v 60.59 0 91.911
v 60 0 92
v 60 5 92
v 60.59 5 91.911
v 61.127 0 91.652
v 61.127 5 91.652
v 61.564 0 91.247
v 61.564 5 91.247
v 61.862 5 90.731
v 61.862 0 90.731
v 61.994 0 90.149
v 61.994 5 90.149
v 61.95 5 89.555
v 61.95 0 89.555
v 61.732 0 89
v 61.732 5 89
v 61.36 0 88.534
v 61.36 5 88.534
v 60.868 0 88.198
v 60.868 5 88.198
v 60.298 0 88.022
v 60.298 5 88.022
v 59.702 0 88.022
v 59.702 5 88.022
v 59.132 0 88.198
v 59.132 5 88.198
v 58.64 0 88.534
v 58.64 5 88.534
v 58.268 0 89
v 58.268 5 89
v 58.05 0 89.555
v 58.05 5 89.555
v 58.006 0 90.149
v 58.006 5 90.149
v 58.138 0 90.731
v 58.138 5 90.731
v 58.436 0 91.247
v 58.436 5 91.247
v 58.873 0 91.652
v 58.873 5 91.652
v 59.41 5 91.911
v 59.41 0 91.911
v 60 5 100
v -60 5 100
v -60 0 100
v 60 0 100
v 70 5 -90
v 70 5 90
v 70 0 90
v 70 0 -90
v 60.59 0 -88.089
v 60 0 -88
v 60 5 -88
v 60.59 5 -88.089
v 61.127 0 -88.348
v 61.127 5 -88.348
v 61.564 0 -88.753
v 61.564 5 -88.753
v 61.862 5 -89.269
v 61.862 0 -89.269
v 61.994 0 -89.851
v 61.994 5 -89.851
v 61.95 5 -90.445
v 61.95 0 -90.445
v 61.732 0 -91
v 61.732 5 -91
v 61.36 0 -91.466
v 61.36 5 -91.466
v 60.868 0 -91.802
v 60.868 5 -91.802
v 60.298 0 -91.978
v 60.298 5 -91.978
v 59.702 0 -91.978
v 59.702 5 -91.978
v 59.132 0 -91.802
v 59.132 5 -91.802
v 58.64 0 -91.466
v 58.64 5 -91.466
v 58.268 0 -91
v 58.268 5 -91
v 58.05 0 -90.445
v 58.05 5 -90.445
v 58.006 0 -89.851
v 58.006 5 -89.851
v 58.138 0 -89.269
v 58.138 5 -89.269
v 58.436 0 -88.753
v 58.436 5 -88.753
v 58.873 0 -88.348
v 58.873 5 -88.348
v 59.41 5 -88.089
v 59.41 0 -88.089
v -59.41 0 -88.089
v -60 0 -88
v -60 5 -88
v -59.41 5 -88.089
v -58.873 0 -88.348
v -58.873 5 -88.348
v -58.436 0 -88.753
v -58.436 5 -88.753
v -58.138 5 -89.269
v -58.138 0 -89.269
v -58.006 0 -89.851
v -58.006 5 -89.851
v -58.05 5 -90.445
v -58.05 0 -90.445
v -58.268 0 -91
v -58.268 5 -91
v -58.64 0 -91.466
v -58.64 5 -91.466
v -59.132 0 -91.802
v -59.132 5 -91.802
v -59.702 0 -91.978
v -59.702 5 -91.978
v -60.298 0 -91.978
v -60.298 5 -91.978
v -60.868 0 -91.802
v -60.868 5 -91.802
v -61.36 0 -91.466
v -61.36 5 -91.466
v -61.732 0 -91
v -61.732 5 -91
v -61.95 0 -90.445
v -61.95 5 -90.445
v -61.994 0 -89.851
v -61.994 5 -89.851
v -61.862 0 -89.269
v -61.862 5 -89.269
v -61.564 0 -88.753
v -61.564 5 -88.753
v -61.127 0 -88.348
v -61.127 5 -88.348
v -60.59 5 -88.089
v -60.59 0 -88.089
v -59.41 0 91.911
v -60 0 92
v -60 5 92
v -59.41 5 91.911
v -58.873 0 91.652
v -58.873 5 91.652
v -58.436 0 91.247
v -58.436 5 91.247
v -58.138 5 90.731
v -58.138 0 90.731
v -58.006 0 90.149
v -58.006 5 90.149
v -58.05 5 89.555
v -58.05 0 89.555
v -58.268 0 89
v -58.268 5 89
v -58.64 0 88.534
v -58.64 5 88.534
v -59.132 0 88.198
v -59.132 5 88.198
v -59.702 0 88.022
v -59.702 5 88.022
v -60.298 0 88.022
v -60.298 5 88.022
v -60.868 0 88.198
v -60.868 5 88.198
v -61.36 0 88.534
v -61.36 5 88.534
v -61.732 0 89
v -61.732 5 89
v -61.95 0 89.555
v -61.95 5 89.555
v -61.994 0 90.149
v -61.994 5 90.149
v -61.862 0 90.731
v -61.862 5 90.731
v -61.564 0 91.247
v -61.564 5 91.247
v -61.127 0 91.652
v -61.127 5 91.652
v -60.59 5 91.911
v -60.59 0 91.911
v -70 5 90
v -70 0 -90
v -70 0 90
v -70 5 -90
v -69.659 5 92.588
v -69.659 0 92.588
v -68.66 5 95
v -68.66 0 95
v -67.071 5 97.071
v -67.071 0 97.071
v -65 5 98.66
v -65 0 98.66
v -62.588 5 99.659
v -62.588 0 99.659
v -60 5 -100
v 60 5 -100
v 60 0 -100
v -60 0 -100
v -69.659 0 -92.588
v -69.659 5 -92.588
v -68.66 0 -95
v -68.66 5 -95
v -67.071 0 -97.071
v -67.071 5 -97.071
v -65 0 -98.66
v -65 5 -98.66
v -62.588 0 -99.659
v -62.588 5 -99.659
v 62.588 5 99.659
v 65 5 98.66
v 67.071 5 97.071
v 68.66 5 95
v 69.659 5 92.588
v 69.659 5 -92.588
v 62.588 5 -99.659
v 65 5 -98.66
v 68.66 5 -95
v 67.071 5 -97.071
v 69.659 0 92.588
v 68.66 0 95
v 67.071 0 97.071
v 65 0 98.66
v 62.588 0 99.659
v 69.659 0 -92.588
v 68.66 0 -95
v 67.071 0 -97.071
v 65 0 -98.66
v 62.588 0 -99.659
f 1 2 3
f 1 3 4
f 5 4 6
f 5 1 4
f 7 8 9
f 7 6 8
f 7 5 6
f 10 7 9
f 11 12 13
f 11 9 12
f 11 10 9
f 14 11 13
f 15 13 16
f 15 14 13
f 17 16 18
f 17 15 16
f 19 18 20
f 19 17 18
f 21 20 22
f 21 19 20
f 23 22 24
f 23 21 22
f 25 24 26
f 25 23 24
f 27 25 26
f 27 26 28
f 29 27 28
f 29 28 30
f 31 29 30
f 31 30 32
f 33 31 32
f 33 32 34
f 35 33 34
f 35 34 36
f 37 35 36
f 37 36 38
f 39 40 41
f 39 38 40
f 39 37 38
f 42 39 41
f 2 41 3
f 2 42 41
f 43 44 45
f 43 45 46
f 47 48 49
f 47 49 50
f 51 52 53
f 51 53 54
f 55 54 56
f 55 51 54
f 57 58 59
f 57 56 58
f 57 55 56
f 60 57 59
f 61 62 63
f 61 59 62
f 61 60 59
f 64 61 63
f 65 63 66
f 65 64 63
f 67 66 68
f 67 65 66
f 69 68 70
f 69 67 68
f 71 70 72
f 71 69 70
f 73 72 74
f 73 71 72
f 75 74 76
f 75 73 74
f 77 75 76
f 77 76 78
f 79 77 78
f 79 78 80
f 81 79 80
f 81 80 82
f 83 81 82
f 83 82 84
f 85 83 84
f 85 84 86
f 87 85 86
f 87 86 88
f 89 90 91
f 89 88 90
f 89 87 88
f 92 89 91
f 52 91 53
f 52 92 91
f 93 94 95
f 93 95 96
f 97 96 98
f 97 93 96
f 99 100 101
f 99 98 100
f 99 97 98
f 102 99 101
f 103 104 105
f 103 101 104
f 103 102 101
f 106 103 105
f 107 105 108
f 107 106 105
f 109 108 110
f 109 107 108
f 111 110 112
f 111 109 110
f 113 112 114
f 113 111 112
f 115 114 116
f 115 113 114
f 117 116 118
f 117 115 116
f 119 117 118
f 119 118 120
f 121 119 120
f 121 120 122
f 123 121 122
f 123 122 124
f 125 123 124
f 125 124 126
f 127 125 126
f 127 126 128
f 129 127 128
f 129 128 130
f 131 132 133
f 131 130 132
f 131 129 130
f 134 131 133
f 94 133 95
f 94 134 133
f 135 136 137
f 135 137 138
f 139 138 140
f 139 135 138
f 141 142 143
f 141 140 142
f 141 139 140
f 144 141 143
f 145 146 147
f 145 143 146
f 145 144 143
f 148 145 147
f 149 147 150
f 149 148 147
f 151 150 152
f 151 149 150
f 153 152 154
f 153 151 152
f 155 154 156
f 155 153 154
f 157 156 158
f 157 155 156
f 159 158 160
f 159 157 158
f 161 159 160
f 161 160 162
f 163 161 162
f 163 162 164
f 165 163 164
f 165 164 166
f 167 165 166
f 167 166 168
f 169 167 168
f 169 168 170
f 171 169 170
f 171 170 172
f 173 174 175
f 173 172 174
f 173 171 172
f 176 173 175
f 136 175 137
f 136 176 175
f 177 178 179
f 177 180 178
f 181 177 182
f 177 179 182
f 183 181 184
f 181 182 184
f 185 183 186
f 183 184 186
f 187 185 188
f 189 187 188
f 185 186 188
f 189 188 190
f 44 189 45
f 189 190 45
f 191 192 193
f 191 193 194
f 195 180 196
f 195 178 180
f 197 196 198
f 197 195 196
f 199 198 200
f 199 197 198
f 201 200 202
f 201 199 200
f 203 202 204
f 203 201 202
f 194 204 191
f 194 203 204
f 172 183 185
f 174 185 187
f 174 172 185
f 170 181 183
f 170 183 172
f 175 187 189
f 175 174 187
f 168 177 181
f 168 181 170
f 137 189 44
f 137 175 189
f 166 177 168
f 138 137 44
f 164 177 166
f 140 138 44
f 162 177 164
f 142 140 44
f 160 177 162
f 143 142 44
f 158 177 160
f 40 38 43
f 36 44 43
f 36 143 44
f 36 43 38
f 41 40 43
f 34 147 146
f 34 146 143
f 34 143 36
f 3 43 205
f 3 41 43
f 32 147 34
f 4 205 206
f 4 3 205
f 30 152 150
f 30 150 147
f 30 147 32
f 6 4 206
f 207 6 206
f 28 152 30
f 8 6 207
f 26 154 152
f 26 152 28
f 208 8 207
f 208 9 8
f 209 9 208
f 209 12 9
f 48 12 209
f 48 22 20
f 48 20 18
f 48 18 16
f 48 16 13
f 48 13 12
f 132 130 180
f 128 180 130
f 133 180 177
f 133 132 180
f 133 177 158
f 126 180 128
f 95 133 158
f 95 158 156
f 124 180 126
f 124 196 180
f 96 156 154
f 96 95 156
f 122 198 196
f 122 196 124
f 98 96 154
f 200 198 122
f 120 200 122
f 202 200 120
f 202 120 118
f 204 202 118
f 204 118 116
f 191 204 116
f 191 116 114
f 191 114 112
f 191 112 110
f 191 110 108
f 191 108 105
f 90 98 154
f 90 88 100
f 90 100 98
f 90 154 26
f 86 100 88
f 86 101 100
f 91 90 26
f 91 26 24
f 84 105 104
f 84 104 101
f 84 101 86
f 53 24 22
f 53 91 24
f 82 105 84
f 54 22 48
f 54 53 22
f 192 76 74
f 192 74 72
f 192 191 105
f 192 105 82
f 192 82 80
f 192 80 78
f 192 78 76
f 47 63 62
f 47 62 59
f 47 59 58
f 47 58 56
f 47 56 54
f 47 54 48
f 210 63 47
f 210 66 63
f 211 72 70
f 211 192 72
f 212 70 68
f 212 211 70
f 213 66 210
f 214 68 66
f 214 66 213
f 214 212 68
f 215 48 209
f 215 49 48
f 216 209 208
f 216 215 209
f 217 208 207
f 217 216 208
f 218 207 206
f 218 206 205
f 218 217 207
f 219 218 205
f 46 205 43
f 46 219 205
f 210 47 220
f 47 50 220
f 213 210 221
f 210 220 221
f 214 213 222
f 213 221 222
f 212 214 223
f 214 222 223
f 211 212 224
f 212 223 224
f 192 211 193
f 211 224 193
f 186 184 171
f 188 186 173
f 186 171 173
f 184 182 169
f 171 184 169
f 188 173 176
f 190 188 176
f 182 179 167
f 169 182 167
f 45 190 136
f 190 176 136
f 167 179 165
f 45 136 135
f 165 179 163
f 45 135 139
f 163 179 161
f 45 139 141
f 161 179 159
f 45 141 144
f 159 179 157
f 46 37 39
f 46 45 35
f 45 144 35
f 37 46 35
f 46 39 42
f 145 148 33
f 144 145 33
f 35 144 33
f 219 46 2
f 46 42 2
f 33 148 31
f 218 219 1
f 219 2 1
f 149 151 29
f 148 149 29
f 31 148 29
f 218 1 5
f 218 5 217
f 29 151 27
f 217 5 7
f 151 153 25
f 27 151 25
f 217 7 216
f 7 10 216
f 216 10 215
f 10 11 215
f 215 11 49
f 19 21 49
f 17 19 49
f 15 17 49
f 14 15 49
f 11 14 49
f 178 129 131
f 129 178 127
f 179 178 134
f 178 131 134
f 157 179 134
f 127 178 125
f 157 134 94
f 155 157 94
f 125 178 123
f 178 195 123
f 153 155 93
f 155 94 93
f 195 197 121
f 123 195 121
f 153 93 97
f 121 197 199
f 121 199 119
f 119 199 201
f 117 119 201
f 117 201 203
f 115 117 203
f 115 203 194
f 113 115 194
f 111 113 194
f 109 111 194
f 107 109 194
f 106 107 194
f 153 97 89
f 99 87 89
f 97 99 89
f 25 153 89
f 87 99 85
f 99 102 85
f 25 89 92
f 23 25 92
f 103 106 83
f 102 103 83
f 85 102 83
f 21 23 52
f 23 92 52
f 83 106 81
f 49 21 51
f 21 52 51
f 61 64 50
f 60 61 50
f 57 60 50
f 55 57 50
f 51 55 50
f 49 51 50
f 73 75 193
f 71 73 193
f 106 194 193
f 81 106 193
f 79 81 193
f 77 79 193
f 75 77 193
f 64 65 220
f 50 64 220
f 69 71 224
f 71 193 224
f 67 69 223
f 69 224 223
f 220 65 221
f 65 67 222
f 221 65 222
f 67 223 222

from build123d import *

# Parameters (mm, degrees)
SKETCH_1_W               = 180
SKETCH_1_H               = 180
EXTRUDE_1_DEPTH          = 5
SKETCH_2_W               = 180
SKETCH_2_H               = 2.5
EXTRUDE_2_DEPTH          = 5
CUT_EXTRUDE_1_DEPTH      = 130.155913531
CUT_EXTRUDE_1_DEPTH_BACK = 130.155913531
SKETCH_3_R               = 2.65
SKETCH_3_W               = 12.5
SKETCH_3_H               = 182.5
SKETCH_4_W               = 167.5
SKETCH_4_H               = 2.5
EXTRUDE_3_DEPTH          = 5
FILLET_1_R               = 10
SKETCH_5_R               = 5.825636989
EXTRUDE_4_DEPTH          = 5
CUT_EXTRUDE_2_DEPTH      = 130.155913531
CUT_EXTRUDE_2_DEPTH_BACK = 130.155913531
SKETCH_6_R               = 1.5
EXTRUDE_5_DEPTH          = 5
CUT_EXTRUDE_3_DEPTH      = 135.629120178
CUT_EXTRUDE_3_DEPTH_BACK = 135.629120178
FILLET_2_R               = 10
CUT_EXTRUDE_4_DEPTH      = 123.167917229
CUT_EXTRUDE_4_DEPTH_BACK = 123.167917229
SKETCH_9_R               = 2


with BuildPart() as part:
    # 草图1 → 凸台-拉伸1 (new body)
    with BuildSketch(Plane(origin=(0, 0, 0), x_dir=(1, 0, 0), z_dir=(0, 1, 0))):
        Rectangle(SKETCH_1_W, SKETCH_1_H)
    extrude(amount=EXTRUDE_1_DEPTH)

    # 草图2 → 凸台-拉伸2 (add)
    with BuildSketch(Plane(origin=(0, 5, 0), x_dir=(1, 0, 0), z_dir=(0, 1, 0))):
        with Locations((0, 91.25)):
            Rectangle(SKETCH_2_W, SKETCH_2_H)
    extrude(amount=-EXTRUDE_2_DEPTH)

    # 草图3 → 切除-拉伸1 (cut, two sides: drawn at the far end of the back side and taken through both)
    with BuildSketch(Plane(origin=(0, 5, 0), x_dir=(1, 0, 0), z_dir=(0, 1, 0)).offset(-CUT_EXTRUDE_1_DEPTH_BACK)):
        with Locations(Location((70, 80, 0), (0, 0, 270))):
            Circle(SKETCH_3_R)
        with Locations((83.75, 1.25)):
            Rectangle(SKETCH_3_W, SKETCH_3_H)
    extrude(amount=CUT_EXTRUDE_1_DEPTH + CUT_EXTRUDE_1_DEPTH_BACK, mode=Mode.SUBTRACT)

    # 草图4 → 凸台-拉伸3 (add)
    with BuildSketch(Plane(origin=(0, 5, 0), x_dir=(1, 0, 0), z_dir=(0, 1, 0))):
        with Locations((-6.25, -91.25)):
            Rectangle(SKETCH_4_W, SKETCH_4_H)
    extrude(amount=-EXTRUDE_3_DEPTH)

    # 圆角1
    fillet_1_edges = [part.edges().sort_by_distance(p)[0] for p in [
        (-90, 2.5, -92.5),
        (77.5, 2.5, -92.5),
        (77.5, 2.5, 92.5),
        (-90, 2.5, 92.5),
    ]]
    fillet(fillet_1_edges, radius=FILLET_1_R)

    # 草图5 → 凸台-拉伸4 (add)
    with BuildSketch(Plane(origin=(0, 5, 0), x_dir=(1, 0, 0), z_dir=(0, 1, 0))):
        with Locations((70, 80)):
            Circle(SKETCH_5_R)
    extrude(amount=-EXTRUDE_4_DEPTH)

    # 草图6 → 切除-拉伸2 (cut, two sides: drawn at the far end of the back side and taken through both)
    with BuildSketch(Plane(origin=(0, 5, 0), x_dir=(1, 0, 0), z_dir=(0, 1, 0)).offset(-CUT_EXTRUDE_2_DEPTH_BACK)):
        with Locations(Location((-82.5, 85, 0), (0, 0, 270))):
            Circle(SKETCH_6_R)
        with Locations(Location((70, 80, 0), (0, 0, 270))):
            Circle(SKETCH_6_R)
        with Locations(Location((-82.5, -85, 0), (0, 0, 270))):
            Circle(SKETCH_6_R)
        with Locations(Location((70, -80, 0), (0, 0, 270))):
            Circle(SKETCH_6_R)
    extrude(amount=CUT_EXTRUDE_2_DEPTH + CUT_EXTRUDE_2_DEPTH_BACK, mode=Mode.SUBTRACT)

    # 草图7 → 凸台-拉伸5 (add)
    with BuildSketch(Plane(origin=(0, 5, 0), x_dir=(1, 0, 0), z_dir=(0, 1, 0))):
        Polygon((-70, 100), (-70, 95.617586071), (-70, 92.5), (-70, -100), (70, -100), (70, 100), align=None)
    extrude(amount=-EXTRUDE_5_DEPTH)

    # 草图8 → 切除-拉伸3 (cut, two sides: drawn at the far end of the back side and taken through both)
    with BuildSketch(Plane(origin=(0, 5, 0), x_dir=(1, 0, 0), z_dir=(0, 1, 0)).offset(-CUT_EXTRUDE_3_DEPTH_BACK)):
        Polygon((-70, 100), (-70, -100), (-179.825652947, -100), (-179.825652947, 129.381792423), align=None)
        Polygon((70, 100), (70, -100), (197.420194338, -114.575162325), (173.755325689, 114.690896211), align=None)
    extrude(amount=CUT_EXTRUDE_3_DEPTH + CUT_EXTRUDE_3_DEPTH_BACK, mode=Mode.SUBTRACT)

    # 圆角2
    fillet_2_edges = [part.edges().sort_by_distance(p)[0] for p in [
        (70, 2.5, -100),
        (-70, 2.5, -100),
        (70, 2.5, 100),
        (-70, 2.5, 100),
    ]]
    fillet(fillet_2_edges, radius=FILLET_2_R)

    # 草图9 → 切除-拉伸4 (cut, two sides: drawn at the far end of the back side and taken through both)
    with BuildSketch(Plane(origin=(0, 5, 0), x_dir=(1, 0, 0), z_dir=(0, 1, 0)).offset(-CUT_EXTRUDE_4_DEPTH_BACK)):
        with Locations(Location((-60, 90, 0), (0, 0, 270))):
            Circle(SKETCH_9_R)
        with Locations(Location((60, 90, 0), (0, 0, 270))):
            Circle(SKETCH_9_R)
        with Locations(Location((-60, -90, 0), (0, 0, 270))):
            Circle(SKETCH_9_R)
        with Locations(Location((60, -90, 0), (0, 0, 270))):
            Circle(SKETCH_9_R)
    extrude(amount=CUT_EXTRUDE_4_DEPTH + CUT_EXTRUDE_4_DEPTH_BACK, mode=Mode.SUBTRACT)


solid = part.part
